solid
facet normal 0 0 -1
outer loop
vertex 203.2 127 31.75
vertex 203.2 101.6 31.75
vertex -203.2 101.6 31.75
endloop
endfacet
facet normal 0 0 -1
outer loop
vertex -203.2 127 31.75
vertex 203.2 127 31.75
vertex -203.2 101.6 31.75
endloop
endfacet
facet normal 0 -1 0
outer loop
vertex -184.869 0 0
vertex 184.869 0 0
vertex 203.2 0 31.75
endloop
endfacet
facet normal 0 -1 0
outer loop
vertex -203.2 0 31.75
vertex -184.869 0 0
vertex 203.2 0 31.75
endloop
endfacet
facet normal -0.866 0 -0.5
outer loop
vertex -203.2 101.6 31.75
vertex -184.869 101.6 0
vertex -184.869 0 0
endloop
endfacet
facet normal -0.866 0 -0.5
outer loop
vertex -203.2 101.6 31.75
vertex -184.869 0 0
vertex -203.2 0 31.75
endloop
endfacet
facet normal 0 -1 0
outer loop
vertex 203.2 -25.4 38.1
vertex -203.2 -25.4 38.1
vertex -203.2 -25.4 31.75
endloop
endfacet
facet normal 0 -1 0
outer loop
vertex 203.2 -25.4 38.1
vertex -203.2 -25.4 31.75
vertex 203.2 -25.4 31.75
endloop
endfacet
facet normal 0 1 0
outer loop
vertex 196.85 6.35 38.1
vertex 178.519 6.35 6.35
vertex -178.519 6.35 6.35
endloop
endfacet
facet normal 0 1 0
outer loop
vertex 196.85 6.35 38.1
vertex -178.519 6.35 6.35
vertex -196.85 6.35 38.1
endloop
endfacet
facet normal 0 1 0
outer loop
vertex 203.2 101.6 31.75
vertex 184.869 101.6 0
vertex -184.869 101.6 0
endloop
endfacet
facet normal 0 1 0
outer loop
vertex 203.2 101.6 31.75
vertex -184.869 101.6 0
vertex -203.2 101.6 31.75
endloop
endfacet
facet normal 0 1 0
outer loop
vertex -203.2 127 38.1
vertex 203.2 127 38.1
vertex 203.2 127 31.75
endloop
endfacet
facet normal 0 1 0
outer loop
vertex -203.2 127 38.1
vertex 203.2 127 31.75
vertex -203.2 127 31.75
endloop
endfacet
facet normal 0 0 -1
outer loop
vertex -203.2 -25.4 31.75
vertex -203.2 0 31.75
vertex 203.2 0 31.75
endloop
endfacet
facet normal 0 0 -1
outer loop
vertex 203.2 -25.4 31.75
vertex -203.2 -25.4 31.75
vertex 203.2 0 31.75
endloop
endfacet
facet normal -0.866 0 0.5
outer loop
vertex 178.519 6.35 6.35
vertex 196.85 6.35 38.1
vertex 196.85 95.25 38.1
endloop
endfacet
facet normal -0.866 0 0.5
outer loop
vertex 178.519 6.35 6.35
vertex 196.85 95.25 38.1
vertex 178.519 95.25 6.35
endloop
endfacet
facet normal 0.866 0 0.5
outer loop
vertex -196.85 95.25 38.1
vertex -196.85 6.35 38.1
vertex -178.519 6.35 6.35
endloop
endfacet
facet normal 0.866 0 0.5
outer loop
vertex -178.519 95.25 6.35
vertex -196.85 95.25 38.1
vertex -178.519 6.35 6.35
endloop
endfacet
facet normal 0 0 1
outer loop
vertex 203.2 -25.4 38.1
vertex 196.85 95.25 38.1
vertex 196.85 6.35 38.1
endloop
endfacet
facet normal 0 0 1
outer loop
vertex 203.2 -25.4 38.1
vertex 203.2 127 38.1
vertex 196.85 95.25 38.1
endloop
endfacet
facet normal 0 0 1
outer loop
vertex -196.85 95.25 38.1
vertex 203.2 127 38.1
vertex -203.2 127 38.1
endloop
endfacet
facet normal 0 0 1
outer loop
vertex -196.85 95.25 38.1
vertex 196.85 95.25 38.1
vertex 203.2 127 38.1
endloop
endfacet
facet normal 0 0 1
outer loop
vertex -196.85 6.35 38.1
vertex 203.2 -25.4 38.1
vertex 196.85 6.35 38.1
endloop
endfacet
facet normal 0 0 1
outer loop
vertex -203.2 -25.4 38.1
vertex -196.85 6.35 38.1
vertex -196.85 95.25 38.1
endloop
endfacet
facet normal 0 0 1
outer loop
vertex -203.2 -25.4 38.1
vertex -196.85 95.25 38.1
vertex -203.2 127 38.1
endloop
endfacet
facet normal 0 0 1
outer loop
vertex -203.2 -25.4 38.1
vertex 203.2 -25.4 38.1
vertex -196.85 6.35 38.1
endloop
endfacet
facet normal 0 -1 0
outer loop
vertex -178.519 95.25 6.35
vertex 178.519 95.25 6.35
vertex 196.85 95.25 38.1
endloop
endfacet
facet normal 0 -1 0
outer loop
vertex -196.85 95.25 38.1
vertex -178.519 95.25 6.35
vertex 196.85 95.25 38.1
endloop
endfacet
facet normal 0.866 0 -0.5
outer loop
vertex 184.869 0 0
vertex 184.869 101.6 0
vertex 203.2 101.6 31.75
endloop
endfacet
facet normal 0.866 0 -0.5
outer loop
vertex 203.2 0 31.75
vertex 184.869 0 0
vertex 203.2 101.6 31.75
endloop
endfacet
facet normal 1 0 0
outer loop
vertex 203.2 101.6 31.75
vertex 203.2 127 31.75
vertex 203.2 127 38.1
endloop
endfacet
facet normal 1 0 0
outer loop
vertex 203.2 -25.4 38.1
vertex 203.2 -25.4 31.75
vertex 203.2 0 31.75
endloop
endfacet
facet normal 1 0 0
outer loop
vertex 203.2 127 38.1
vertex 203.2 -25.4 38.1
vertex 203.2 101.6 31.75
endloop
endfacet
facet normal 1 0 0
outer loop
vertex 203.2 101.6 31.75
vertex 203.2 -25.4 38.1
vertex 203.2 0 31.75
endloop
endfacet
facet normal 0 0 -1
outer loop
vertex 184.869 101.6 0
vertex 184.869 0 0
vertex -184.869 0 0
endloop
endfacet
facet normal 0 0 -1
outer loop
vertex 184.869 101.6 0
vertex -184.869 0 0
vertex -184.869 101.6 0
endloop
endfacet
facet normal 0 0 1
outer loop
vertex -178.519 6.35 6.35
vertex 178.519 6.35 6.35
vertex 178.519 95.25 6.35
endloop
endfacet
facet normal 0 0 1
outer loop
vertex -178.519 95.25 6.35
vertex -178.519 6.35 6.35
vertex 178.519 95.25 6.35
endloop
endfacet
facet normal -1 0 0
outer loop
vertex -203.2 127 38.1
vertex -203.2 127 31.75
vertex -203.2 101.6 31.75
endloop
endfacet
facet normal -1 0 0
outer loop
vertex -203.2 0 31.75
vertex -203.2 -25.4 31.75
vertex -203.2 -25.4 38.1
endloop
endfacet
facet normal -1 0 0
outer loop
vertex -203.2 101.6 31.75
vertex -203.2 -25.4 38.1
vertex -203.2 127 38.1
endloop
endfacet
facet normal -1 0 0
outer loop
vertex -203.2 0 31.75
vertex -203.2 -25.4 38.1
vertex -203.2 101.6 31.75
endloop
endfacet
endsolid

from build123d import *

# Parameters (mm, degrees)
F0_W      = 101.6
F0_H      = 38.1
F1_DEPTH  = 203.2
F3_T      = -6.35
F2_W      = 406.4
F2_H      = 6.35
F4_DEPTH  = 25.4
F5_W      = 406.4
F5_H      = 6.35
F6_DEPTH  = 25.4
F8_DEPTH  = 88.9
F10_DEPTH = 141.224


# Not quite as in the source:
# - a pattern or mirror of a feature is missing from the dataset's text; its kind, count and spacing are read off the source's solid


with BuildPart() as f1:
    # F0 (on Right) → F1 (new body, symmetric)
    with BuildSketch(Plane.YZ):
        with Locations((50.8, 19.05)):
            Rectangle(F0_W, F0_H)
    extrude(amount=F1_DEPTH, both=True)

    # F3
    f3_openings = [f1.faces().sort_by_distance(p)[0] for p in [
        (0, 50.8, 38.1),
    ]]
    offset(amount=F3_T, openings=f3_openings)

    # F2 (on face) → F4 (join)
    with BuildSketch(Plane.XZ):
        with Locations((0, 34.925)):
            Rectangle(F2_W, F2_H)
    extrude(amount=F4_DEPTH)

    # F5 (on face) → F6 (join)
    with BuildSketch(Plane(origin=(0, 101.6, 0), x_dir=(-1, 0, 0), z_dir=(0, 1, 0))):
        with Locations((0, 34.925)):
            Rectangle(F5_W, F5_H)
    extrude(amount=F6_DEPTH)

    # F7 (on face) → F8 (join, through all)
    with BuildSketch(Plane(origin=(0, 6.35, 0), x_dir=(-1, 0, 0), z_dir=(0, 1, 0))):
        Polygon((196.85, 6.35), (196.85, 38.1), (178.5191289532, 6.35), align=None)
    f8 = extrude(amount=F8_DEPTH)

    # F8_copies: F8 across plane
    add(f8.mirror(Plane(origin=(0, 0, 0), x_dir=(0, 0, 1), z_dir=(1, 0, 0))))

    # F9 (on Front) → F10 (cut)
    with BuildSketch(Plane.XZ):
        Polygon((-184.8691289532, 0), (-203.2, 31.75), (-203.2, 0), align=None)
    f10 = extrude(amount=-F10_DEPTH, mode=Mode.SUBTRACT)

    # F10_copies: F10 across plane
    add(f10.mirror(Plane(origin=(0, 0, 0), x_dir=(0, 0, 1), z_dir=(1, 0, 0))), mode=Mode.SUBTRACT)


solid = f1.part
